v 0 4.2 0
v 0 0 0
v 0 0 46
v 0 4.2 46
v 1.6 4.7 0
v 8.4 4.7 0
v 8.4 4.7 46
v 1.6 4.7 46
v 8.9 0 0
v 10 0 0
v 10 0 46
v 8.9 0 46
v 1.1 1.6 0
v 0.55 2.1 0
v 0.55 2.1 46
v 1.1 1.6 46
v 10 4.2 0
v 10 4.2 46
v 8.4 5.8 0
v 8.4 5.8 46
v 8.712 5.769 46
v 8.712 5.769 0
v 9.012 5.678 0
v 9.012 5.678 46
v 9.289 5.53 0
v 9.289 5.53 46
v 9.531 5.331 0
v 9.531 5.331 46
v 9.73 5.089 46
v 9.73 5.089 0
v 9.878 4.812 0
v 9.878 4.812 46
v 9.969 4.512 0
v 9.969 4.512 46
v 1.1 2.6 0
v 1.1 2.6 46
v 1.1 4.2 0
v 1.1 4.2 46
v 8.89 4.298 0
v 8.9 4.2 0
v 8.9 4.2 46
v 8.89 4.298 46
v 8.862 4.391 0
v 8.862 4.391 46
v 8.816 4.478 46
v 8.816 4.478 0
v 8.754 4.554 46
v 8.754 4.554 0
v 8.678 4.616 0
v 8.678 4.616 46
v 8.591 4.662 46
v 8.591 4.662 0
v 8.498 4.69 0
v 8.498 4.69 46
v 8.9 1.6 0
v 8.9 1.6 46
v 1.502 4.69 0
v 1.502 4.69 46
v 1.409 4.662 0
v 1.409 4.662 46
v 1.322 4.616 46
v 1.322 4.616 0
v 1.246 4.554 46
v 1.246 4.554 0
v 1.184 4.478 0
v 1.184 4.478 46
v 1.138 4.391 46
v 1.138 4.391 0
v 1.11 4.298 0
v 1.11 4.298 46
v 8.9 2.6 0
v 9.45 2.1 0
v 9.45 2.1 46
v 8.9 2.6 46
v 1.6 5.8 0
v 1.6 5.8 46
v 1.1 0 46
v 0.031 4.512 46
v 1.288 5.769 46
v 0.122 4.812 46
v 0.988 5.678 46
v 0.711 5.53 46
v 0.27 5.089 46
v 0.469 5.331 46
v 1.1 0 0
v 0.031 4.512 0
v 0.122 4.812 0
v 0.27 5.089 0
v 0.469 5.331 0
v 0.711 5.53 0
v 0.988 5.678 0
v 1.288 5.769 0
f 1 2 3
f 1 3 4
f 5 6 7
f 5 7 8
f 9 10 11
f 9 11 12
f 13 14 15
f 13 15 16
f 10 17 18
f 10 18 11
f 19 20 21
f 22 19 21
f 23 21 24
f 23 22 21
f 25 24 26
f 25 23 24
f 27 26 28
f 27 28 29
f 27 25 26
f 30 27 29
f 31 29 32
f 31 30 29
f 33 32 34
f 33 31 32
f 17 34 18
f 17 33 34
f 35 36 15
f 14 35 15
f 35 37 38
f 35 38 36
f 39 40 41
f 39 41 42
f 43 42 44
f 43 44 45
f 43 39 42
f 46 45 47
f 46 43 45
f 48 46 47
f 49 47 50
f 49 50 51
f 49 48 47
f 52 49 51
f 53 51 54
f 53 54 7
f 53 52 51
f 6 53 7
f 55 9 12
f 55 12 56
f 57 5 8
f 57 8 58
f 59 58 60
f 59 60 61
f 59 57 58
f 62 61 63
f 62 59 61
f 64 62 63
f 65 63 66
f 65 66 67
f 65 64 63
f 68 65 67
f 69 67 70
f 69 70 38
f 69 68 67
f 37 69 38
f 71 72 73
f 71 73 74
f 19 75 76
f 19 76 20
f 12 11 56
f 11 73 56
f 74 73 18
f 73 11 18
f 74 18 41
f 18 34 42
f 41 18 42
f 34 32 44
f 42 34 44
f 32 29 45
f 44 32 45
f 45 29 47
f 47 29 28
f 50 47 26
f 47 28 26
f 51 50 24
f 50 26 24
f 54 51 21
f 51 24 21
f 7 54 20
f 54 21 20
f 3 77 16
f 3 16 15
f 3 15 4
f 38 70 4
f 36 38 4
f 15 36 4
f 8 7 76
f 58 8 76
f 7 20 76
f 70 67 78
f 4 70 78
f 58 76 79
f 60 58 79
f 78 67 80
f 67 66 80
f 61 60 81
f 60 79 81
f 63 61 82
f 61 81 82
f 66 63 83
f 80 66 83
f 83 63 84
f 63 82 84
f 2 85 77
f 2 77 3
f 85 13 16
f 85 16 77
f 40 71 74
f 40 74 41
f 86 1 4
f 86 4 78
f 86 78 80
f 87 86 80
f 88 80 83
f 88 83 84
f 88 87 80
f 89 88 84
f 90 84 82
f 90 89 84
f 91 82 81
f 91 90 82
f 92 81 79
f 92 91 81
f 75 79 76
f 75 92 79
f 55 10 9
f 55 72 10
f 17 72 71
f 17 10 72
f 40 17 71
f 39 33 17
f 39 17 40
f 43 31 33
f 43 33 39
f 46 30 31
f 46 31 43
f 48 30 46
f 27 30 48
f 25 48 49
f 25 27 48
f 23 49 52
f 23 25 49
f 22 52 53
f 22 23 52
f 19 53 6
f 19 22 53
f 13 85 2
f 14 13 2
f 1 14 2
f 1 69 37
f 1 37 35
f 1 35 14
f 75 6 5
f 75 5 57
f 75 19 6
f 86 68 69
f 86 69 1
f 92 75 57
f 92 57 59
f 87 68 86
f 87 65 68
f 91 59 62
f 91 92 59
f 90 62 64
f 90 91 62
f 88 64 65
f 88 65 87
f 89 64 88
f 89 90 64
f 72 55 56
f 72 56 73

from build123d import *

# Parameters (mm, degrees)
EXTRUSION1_DEPTH = 46


with BuildPart() as part:
    # Esquisse1 → Extrusion1 (new body)
    with BuildSketch(Plane.XY):
        with BuildLine():
            Line((1.6, 5.8), (8.4, 5.8))
            ThreePointArc((8.4, 5.8), (9.53137085, 5.33137085), (10, 4.2))
            Line((10, 4.2), (10, 0))
            Line((10, 0), (8.9, 0))
            Line((8.9, 0), (8.9, 1.6))
            Line((8.9, 1.6), (9.45, 2.1))
            Line((9.45, 2.1), (8.9, 2.6))
            Line((8.9, 2.6), (8.9, 4.2))
            ThreePointArc((8.9, 4.2), (8.753553391, 4.553553391), (8.4, 4.7))
            Line((8.4, 4.7), (1.6, 4.7))
            ThreePointArc((1.6, 4.7), (1.246446609, 4.553553391), (1.1, 4.2))
            Line((1.1, 4.2), (1.1, 2.6))
            Line((1.1, 2.6), (0.55, 2.1))
            Line((0.55, 2.1), (1.1, 1.6))
            Line((1.1, 1.6), (1.1, 0))
            Line((1.1, 0), (0, 0))
            Line((0, 0), (0, 4.2))
            ThreePointArc((0, 4.2), (0.46862915, 5.33137085), (1.6, 5.8))
        make_face()
    extrude(amount=EXTRUSION1_DEPTH)


solid = part.part
